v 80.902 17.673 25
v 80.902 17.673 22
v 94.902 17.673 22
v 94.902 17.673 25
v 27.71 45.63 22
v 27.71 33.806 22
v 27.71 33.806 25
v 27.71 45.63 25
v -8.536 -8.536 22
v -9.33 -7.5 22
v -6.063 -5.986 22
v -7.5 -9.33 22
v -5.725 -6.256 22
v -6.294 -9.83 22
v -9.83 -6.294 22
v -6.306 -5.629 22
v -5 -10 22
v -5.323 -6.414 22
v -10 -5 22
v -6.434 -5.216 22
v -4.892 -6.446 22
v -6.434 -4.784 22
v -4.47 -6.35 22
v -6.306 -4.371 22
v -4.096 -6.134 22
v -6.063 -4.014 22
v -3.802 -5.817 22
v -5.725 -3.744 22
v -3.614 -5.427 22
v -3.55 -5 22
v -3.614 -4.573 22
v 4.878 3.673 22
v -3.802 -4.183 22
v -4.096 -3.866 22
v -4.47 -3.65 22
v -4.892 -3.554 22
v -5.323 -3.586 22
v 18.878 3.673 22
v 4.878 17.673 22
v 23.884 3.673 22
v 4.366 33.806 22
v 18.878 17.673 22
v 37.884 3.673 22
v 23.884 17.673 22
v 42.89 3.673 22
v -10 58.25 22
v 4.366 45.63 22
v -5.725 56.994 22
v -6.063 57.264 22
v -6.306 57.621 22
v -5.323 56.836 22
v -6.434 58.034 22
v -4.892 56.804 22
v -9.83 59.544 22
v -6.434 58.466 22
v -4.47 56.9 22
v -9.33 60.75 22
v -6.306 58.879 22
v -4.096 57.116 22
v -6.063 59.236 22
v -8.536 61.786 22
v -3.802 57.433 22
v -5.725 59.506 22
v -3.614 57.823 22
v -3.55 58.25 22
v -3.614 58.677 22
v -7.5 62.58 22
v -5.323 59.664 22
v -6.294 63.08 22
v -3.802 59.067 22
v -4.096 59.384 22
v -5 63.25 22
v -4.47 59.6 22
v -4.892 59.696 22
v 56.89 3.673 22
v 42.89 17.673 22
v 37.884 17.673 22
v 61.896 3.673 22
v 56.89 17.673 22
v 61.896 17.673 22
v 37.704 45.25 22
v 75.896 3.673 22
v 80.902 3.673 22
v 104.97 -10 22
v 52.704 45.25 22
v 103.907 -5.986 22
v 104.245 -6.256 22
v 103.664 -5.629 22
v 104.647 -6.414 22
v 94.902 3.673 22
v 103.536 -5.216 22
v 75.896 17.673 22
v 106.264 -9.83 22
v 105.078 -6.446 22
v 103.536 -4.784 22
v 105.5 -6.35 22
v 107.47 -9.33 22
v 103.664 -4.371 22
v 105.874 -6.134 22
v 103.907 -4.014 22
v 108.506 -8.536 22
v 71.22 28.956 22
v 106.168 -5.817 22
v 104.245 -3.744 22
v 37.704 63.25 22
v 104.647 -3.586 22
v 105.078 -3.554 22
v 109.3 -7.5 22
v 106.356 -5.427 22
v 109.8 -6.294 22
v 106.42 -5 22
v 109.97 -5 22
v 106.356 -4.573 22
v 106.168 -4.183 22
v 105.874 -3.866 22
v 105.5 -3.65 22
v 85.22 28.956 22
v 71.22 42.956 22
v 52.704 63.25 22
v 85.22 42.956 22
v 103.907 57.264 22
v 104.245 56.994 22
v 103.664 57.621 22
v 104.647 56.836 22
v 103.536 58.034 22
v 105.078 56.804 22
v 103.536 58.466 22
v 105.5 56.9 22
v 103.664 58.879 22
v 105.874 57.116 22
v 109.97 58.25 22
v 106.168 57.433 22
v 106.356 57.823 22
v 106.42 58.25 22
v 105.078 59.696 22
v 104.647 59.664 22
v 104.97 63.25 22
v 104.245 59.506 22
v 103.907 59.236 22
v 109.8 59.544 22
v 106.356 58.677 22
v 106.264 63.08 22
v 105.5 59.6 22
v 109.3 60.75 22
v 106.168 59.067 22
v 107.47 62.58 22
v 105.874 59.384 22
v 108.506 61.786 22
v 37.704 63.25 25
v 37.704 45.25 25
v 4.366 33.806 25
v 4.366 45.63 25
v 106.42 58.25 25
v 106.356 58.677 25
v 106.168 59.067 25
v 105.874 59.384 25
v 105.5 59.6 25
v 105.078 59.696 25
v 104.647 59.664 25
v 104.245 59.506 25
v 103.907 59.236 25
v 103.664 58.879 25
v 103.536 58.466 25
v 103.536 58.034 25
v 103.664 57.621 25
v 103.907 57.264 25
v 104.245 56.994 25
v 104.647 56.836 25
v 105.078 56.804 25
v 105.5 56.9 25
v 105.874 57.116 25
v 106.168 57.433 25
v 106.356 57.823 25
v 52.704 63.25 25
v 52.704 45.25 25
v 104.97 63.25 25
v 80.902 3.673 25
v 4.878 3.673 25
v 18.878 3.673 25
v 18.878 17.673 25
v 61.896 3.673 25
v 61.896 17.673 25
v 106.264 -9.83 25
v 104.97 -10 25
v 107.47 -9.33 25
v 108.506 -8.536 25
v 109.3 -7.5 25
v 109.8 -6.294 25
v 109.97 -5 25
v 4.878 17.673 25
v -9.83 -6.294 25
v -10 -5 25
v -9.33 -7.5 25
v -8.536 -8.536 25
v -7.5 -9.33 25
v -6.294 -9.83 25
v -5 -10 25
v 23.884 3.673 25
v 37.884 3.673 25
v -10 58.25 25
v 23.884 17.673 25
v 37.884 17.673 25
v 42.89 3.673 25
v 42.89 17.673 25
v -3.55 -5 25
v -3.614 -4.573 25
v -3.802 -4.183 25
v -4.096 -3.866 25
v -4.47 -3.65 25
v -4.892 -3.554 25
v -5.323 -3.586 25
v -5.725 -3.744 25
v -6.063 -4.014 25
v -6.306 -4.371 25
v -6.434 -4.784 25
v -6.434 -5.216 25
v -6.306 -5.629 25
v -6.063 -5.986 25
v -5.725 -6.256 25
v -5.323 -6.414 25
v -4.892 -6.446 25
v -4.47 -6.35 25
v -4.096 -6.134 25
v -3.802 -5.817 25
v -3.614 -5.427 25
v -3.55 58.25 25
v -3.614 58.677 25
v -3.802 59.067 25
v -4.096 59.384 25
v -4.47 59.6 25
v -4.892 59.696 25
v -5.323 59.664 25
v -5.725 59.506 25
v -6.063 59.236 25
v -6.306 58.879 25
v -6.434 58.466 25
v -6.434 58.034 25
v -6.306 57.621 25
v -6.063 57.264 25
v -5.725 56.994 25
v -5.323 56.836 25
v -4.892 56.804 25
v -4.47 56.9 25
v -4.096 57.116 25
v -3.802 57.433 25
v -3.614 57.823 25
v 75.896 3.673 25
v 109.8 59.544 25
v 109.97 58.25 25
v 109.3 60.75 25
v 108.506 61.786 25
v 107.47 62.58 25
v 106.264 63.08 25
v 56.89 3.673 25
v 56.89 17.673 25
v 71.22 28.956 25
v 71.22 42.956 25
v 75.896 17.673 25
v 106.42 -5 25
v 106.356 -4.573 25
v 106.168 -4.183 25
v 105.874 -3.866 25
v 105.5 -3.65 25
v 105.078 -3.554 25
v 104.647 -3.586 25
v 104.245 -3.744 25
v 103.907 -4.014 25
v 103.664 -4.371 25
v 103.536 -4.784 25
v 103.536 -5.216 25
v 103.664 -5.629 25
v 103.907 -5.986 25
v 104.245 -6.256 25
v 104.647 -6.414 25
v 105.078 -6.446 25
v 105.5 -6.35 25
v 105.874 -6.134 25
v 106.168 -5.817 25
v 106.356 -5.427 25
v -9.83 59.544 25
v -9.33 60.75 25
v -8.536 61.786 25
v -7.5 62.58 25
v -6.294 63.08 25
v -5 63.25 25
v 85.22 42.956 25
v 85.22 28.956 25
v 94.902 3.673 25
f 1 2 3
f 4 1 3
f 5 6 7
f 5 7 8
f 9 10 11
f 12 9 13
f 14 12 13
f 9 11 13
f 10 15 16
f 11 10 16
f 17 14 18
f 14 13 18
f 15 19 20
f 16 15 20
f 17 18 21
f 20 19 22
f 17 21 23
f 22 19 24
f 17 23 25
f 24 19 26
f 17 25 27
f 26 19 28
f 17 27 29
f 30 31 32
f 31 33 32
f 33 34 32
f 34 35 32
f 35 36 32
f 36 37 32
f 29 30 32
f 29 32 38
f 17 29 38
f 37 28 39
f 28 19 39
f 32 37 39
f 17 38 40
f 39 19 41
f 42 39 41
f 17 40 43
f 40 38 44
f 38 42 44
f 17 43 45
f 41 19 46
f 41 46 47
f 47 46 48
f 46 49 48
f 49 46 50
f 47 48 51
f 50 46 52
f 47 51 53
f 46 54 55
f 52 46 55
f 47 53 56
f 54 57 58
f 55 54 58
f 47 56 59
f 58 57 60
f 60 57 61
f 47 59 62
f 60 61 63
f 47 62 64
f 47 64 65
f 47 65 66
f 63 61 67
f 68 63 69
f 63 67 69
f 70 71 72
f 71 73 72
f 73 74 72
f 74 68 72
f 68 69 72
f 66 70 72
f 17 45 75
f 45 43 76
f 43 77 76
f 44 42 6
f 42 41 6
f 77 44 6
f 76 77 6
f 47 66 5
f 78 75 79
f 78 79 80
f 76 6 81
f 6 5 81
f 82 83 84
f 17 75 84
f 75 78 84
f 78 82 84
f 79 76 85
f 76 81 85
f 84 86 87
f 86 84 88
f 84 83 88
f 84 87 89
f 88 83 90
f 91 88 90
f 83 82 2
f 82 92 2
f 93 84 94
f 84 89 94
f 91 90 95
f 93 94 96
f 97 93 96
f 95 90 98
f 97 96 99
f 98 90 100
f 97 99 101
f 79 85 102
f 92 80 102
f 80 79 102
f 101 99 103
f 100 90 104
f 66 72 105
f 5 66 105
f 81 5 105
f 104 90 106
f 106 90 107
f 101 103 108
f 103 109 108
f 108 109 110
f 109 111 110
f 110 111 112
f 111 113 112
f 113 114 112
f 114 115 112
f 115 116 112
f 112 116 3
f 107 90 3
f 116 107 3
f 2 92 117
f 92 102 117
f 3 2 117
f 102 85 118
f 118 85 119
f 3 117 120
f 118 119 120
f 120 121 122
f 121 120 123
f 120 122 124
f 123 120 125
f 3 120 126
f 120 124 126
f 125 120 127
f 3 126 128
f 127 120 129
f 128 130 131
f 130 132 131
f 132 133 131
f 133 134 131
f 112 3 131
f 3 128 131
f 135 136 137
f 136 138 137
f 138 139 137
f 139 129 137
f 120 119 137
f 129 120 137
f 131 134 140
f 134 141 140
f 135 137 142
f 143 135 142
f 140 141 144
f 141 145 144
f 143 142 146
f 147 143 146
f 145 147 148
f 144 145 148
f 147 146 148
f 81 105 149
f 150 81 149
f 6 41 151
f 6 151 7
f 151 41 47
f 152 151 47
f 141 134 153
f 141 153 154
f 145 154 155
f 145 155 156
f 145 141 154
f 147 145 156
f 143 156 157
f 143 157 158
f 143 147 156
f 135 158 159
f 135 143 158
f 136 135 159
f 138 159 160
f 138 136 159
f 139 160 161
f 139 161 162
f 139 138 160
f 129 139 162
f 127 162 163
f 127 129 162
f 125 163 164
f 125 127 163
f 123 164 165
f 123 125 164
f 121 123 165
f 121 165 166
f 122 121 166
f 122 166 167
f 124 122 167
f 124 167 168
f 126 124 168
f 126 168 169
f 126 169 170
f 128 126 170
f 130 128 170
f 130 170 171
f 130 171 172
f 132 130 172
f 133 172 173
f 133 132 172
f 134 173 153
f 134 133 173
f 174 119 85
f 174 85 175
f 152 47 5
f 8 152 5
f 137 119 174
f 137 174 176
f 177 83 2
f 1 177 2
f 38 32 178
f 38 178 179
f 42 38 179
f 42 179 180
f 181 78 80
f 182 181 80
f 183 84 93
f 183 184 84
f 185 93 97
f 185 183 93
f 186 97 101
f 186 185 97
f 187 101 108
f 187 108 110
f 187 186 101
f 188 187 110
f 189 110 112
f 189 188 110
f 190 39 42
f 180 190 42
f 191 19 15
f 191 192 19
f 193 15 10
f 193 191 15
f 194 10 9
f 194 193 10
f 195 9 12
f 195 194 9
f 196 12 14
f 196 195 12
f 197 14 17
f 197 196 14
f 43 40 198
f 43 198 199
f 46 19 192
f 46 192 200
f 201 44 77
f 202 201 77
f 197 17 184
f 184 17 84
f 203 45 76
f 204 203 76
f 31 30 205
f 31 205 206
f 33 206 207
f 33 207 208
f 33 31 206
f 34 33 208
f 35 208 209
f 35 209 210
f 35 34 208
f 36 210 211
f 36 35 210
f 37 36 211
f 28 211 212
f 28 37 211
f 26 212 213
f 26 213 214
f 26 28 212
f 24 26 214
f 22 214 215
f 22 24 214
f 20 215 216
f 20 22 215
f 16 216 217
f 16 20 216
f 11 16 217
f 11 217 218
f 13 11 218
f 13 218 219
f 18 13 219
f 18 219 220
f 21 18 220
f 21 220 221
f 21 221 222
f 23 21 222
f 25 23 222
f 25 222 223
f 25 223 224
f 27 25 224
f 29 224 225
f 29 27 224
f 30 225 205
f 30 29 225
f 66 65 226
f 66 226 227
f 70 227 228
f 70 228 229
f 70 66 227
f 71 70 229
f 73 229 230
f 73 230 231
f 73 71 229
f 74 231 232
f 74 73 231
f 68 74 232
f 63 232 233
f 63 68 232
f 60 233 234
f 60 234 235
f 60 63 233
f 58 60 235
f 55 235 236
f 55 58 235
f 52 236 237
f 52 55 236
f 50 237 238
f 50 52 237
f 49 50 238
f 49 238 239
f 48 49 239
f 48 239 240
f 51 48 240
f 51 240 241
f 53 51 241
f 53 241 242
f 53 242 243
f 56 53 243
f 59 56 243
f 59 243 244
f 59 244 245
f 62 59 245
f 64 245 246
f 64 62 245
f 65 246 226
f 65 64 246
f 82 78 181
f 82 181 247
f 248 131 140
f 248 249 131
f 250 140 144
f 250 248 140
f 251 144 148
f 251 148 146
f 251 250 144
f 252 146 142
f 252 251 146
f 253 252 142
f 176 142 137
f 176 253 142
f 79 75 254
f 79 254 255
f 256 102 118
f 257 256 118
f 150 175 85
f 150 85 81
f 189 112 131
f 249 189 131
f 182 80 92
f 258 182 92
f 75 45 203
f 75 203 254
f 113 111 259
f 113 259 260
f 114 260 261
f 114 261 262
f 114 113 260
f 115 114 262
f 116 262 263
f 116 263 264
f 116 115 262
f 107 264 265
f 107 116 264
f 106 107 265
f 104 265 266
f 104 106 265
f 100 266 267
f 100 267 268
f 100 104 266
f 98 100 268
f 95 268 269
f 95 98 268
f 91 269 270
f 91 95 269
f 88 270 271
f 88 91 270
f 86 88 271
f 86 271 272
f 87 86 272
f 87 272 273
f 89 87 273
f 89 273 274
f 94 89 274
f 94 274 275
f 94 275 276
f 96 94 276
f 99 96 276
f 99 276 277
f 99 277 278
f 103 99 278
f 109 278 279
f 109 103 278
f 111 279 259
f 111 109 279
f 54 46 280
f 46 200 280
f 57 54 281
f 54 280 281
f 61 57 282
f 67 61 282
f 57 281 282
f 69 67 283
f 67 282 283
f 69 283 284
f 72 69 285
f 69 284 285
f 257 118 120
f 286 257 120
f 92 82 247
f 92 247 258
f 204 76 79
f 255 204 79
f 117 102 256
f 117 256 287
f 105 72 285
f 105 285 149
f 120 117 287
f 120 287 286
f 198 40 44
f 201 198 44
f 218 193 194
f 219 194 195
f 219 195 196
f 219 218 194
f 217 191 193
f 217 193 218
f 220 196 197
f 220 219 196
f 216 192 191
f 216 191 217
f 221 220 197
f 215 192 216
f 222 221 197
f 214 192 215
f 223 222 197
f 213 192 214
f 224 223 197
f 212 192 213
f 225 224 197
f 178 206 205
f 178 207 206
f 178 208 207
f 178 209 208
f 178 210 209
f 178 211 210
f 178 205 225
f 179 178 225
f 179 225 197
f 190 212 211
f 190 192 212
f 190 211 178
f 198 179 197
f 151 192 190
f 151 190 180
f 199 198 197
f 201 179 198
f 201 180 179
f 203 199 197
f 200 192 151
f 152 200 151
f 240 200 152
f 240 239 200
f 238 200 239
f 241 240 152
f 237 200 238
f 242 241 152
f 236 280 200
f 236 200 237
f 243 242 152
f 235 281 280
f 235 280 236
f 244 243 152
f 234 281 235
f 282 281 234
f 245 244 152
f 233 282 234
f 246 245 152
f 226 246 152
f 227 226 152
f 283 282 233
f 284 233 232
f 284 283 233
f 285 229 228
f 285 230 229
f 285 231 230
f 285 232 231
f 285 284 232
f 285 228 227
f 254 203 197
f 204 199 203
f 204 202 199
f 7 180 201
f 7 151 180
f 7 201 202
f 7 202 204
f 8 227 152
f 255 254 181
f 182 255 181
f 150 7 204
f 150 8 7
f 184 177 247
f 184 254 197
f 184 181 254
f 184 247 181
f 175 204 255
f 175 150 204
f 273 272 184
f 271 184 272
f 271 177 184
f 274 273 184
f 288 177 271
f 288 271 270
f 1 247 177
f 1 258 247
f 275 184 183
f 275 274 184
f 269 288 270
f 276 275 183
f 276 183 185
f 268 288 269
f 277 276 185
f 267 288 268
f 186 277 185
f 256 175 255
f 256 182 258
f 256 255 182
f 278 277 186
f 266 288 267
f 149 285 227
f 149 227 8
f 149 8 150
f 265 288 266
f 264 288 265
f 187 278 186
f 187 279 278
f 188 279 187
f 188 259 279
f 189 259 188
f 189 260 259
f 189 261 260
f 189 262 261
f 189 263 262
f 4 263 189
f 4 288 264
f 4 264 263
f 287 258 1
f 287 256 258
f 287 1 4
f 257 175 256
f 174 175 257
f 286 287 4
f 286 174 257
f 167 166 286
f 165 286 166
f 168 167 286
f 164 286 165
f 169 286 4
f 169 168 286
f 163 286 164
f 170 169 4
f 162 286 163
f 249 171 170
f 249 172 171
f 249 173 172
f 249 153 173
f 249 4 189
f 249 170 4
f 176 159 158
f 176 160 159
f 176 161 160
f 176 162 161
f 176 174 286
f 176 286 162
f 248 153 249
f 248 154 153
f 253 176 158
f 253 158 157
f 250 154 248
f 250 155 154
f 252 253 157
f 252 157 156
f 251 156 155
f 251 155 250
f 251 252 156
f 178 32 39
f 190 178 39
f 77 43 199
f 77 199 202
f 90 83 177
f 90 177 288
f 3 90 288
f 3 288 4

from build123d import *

# Parameters (mm, degrees)
SKETCH003_W      = 15
SKETCH003_H      = 3
EXTRUDE003_DEPTH = 18
SKETCH002_W      = 119.97
SKETCH002_H      = 73.25
SKETCH002_R      = 1.45
SKETCH002_W_2    = 14
SKETCH002_H_2    = 14
SKETCH002_W_3    = 23.344
SKETCH002_H_3    = 11.824
EXTRUDE002_DEPTH = 3
FILLET001_R      = 5


with BuildPart() as extrude003:
    # Sketch003 (on Face4 of Extrude002) → Extrude003 (new body)
    with BuildSketch(Plane(origin=(0, 63.25, 0), x_dir=(-1, 0, 0), z_dir=(0, 1, 0))):
        with Locations((-45.204, 23.5)):
            Rectangle(SKETCH003_W, SKETCH003_H)
    extrude(amount=-EXTRUDE003_DEPTH)


with BuildPart() as fillet001:
    # Sketch002 (on Face14 of Extrude001) → Extrude002 (new body)
    with BuildSketch(Plane.XY.offset(22)):
        with Locations((49.985, 26.625)):
            Rectangle(SKETCH002_W, SKETCH002_H)
        with Locations((104.97, -5)):
            Circle(SKETCH002_R, mode=Mode.SUBTRACT)
        with Locations((104.97, 58.25)):
            Circle(SKETCH002_R, mode=Mode.SUBTRACT)
        with Locations((-5, 58.25)):
            Circle(SKETCH002_R, mode=Mode.SUBTRACT)
        with Locations((-5, -5)):
            Circle(SKETCH002_R, mode=Mode.SUBTRACT)
        with Locations((87.902, 10.673)):
            Rectangle(SKETCH002_W_2, SKETCH002_H_2, mode=Mode.SUBTRACT)
        with Locations((68.896, 10.673)):
            Rectangle(SKETCH002_W_2, SKETCH002_H_2, mode=Mode.SUBTRACT)
        with Locations((49.89, 10.673)):
            Rectangle(SKETCH002_W_2, SKETCH002_H_2, mode=Mode.SUBTRACT)
        with Locations((30.884, 10.673)):
            Rectangle(SKETCH002_W_2, SKETCH002_H_2, mode=Mode.SUBTRACT)
        with Locations((11.878, 10.673)):
            Rectangle(SKETCH002_W_2, SKETCH002_H_2, mode=Mode.SUBTRACT)
        with Locations((78.22, 35.956)):
            Rectangle(SKETCH002_W_2, SKETCH002_H_2, mode=Mode.SUBTRACT)
        with Locations((16.038, 39.718)):
            Rectangle(SKETCH002_W_3, SKETCH002_H_3, mode=Mode.SUBTRACT)
    extrude(amount=EXTRUDE002_DEPTH)

    # Cut: cut Extrude003
    add(extrude003.part, mode=Mode.SUBTRACT)

    # Fillet001
    fillet001_edges = [fillet001.edges().sort_by_distance(p)[0] for p in [
        (-10, 63.25, 23.5),
        (-10, -10, 23.5),
        (109.97, -10, 23.5),
        (109.97, 63.25, 23.5),
    ]]
    fillet(fillet001_edges, radius=FILLET001_R)


solid = fillet001.part
